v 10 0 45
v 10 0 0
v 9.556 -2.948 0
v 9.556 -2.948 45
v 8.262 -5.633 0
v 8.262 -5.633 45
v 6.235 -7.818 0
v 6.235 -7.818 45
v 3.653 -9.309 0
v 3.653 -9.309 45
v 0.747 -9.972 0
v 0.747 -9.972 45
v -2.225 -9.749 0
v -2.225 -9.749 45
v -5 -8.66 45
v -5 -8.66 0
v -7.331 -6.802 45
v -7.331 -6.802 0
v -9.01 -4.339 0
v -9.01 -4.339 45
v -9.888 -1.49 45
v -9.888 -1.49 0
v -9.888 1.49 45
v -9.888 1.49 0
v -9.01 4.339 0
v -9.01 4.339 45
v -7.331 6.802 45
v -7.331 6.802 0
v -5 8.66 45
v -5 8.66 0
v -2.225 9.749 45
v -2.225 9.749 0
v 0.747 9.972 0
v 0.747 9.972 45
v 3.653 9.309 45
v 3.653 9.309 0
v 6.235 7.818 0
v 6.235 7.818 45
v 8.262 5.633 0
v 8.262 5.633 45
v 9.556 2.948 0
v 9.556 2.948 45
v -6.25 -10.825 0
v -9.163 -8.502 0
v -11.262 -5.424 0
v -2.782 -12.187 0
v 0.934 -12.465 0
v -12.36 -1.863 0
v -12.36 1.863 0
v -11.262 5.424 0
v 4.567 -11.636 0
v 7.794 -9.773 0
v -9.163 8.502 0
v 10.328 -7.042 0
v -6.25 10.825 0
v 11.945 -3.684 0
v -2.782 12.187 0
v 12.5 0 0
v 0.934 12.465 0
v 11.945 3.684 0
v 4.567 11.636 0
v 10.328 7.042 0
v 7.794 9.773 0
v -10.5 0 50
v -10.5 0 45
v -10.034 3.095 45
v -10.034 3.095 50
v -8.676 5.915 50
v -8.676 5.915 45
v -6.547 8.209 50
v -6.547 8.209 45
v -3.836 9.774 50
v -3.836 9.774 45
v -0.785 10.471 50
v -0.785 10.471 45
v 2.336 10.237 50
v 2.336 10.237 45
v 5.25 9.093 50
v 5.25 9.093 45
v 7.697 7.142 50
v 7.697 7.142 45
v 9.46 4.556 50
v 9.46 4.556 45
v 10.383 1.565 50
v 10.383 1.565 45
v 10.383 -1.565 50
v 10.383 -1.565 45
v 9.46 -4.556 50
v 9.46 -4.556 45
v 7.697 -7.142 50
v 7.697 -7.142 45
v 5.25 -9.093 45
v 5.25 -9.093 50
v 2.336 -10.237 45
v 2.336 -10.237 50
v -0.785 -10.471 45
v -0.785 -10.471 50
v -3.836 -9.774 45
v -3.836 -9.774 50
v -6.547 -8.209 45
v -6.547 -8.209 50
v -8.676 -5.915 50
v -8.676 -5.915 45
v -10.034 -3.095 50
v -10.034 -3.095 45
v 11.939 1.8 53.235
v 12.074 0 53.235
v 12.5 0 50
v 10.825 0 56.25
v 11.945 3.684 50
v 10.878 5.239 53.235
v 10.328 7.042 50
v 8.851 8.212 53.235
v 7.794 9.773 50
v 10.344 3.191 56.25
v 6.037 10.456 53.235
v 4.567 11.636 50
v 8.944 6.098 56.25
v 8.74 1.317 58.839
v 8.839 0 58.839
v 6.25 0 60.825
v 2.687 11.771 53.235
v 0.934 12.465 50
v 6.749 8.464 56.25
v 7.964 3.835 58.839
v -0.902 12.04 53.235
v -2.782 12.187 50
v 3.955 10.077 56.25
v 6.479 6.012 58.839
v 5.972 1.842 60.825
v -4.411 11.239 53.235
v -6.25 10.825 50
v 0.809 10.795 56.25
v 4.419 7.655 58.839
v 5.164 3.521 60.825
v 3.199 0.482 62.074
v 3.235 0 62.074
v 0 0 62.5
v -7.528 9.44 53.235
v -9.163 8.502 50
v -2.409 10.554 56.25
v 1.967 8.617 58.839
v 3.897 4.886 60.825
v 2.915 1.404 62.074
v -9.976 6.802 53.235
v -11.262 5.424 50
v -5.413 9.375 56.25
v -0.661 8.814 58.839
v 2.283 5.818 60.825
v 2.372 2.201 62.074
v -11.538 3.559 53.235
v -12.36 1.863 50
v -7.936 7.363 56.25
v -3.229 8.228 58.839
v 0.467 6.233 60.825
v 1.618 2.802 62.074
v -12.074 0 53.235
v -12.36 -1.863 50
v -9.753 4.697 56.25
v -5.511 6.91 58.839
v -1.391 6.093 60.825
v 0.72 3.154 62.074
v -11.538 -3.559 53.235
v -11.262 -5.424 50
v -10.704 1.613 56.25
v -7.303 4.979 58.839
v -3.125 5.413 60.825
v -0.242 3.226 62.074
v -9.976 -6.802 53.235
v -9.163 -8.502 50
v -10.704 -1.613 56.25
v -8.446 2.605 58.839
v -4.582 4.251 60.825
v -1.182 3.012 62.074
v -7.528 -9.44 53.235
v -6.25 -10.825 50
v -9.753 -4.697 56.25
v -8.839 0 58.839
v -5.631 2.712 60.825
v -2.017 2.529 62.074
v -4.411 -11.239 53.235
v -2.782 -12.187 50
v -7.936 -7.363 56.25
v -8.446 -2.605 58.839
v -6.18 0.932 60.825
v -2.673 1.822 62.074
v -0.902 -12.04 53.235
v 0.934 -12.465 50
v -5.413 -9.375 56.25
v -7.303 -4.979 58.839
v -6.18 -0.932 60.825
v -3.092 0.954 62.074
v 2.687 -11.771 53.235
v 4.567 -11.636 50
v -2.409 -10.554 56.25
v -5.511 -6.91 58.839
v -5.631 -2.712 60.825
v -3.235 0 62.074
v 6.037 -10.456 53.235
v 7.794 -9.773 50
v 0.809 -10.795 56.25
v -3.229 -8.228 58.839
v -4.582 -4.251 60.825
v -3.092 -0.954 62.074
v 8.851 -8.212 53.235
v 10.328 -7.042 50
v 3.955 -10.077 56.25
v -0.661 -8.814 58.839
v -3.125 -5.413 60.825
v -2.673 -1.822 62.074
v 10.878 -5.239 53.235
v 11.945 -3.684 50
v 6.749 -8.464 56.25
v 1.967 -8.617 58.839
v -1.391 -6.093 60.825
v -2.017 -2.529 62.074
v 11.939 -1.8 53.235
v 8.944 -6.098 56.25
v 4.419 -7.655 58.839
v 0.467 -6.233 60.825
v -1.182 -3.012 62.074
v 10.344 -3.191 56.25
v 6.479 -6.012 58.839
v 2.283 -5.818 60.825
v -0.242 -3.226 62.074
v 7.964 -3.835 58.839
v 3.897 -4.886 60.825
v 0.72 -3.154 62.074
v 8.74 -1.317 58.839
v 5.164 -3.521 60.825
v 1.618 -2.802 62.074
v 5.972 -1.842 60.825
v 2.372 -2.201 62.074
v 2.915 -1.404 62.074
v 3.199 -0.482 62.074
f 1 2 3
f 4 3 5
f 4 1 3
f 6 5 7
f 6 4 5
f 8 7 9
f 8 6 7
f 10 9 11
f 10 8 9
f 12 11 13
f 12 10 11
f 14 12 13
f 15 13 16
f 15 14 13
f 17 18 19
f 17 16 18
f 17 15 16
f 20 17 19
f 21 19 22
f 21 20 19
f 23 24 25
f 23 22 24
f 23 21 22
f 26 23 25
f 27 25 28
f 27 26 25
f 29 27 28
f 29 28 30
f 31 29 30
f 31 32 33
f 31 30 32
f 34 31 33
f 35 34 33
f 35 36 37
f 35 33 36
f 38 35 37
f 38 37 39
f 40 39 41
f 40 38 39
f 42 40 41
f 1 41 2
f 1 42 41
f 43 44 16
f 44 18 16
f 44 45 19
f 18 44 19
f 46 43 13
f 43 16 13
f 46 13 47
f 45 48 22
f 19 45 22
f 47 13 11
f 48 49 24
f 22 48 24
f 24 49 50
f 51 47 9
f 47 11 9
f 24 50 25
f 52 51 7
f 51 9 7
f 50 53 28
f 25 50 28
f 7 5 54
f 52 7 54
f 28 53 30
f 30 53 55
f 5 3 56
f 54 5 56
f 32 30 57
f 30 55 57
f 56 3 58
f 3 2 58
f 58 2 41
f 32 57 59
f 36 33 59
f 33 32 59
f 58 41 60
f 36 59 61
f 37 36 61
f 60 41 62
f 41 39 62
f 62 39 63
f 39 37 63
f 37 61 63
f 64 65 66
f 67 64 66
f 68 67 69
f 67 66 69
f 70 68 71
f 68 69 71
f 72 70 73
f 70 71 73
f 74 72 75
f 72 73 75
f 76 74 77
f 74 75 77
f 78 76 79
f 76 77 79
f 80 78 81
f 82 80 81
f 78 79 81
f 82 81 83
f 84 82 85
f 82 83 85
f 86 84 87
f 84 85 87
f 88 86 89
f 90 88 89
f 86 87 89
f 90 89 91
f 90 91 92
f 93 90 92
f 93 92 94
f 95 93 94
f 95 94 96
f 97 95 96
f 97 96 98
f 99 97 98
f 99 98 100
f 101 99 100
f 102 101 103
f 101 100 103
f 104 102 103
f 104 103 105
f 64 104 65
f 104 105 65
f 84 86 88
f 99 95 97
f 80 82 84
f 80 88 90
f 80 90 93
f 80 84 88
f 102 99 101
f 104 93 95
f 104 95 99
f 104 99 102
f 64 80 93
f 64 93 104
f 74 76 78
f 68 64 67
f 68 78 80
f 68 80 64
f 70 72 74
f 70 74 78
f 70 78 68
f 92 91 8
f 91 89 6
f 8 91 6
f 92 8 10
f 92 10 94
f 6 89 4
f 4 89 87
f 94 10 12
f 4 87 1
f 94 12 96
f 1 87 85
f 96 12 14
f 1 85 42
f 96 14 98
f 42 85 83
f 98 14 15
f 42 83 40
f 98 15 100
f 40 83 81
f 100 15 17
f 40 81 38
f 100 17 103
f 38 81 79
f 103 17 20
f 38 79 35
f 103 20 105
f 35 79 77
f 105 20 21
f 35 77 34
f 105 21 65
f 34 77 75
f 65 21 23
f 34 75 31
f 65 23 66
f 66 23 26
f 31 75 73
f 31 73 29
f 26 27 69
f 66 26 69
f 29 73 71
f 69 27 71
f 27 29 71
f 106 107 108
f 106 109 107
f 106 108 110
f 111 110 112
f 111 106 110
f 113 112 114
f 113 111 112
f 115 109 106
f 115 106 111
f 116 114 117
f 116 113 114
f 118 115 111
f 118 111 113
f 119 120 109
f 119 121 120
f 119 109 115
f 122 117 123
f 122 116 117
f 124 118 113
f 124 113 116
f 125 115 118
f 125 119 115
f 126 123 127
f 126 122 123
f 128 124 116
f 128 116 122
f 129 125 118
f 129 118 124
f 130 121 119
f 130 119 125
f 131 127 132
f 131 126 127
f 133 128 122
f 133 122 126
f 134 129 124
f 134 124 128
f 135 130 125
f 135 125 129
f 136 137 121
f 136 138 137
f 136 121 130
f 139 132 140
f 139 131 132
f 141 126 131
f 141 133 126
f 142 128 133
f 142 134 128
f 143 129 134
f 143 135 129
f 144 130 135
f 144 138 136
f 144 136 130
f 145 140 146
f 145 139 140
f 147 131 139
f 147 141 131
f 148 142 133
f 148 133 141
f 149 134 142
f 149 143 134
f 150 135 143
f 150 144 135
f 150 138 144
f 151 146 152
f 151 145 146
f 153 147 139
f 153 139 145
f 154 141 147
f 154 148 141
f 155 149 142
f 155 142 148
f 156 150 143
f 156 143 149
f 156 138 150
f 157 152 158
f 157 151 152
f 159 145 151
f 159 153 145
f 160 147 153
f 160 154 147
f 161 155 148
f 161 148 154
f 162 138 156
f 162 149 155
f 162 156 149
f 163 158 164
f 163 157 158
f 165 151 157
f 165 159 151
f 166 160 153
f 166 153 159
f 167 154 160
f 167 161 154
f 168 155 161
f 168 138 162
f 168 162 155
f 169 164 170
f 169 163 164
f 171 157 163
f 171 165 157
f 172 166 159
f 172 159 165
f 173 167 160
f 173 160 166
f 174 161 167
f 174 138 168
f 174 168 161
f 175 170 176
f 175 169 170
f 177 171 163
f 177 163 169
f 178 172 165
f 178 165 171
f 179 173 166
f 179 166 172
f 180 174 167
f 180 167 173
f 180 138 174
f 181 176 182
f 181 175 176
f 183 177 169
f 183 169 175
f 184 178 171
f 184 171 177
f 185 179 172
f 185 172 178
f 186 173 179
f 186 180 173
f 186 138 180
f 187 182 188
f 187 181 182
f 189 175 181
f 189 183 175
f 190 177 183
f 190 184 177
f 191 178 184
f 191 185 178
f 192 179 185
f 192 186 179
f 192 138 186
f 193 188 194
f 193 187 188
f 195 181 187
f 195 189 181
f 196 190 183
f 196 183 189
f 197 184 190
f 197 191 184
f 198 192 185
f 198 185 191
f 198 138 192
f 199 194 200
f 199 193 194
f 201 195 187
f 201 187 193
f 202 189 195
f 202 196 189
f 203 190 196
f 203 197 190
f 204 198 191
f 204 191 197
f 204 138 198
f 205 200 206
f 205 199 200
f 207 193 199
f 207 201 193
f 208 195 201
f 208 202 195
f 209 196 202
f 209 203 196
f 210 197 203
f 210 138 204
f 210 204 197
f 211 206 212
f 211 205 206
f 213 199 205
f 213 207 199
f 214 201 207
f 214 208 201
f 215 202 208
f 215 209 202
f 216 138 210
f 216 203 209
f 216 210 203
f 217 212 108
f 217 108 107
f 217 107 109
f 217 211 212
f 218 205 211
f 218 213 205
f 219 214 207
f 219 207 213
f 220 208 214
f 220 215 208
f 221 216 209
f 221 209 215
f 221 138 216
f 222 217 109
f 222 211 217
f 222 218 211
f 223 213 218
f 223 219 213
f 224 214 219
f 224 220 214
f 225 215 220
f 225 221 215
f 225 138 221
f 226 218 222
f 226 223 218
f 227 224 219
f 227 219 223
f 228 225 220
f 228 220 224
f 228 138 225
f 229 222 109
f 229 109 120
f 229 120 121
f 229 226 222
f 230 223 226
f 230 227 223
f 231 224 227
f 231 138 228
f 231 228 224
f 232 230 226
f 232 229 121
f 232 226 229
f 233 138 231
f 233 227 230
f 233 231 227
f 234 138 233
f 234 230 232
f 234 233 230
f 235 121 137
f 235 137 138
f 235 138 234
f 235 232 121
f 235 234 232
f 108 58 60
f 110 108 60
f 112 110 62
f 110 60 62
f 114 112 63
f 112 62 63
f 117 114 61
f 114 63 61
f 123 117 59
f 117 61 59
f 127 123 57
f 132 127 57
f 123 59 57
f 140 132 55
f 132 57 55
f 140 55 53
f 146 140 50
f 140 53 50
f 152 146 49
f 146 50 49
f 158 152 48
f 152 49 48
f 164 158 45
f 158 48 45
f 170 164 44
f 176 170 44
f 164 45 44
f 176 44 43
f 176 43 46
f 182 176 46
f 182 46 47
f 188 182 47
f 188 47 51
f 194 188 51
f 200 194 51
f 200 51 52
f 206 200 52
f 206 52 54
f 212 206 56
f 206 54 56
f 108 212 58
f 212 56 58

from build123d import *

# Parameters (mm, degrees)
SKETCH_1_R               = 12.5
EXTRUDE_1_DEPTH          = 62.5
FILLET_1_R               = 12.5
CUT_EXTRUDE_1_DEPTH      = 65.951905284
CUT_EXTRUDE_1_DEPTH_BACK = 45
SKETCH_2_R               = 10
SKETCH_3_R               = 10.5
CUT_EXTRUDE_2_DEPTH      = 5


with BuildPart() as part:
    # 草图1 → 凸台-拉伸1 (new body)
    with BuildSketch(Plane.XY):
        Circle(SKETCH_1_R)
    extrude(amount=EXTRUDE_1_DEPTH)

    # 圆角1
    fillet_1_edges = [part.edges().sort_by_distance(p)[0] for p in [
        (-12.5, 0, 62.5),
    ]]
    fillet(fillet_1_edges, radius=FILLET_1_R)

    # 草图2 → 切除-拉伸1 (cut, two sides: drawn at the far end of the back side and taken through both)
    with BuildSketch(Plane(origin=(0, 0, 0), x_dir=(-1, 0, 0), z_dir=(0, 0, -1)).offset(-CUT_EXTRUDE_1_DEPTH_BACK)):
        with Locations(Location((0, 0, 0), (0, 0, 180))):
            Circle(SKETCH_2_R)
    extrude(amount=CUT_EXTRUDE_1_DEPTH + CUT_EXTRUDE_1_DEPTH_BACK, mode=Mode.SUBTRACT)

    # 草图3 → 切除-拉伸2 (cut)
    with BuildSketch(Plane(origin=(0, 0, 45), x_dir=(-1, 0, 0), z_dir=(0, 0, -1))):
        Circle(SKETCH_3_R)
    extrude(amount=-CUT_EXTRUDE_2_DEPTH, mode=Mode.SUBTRACT)


solid = part.part
